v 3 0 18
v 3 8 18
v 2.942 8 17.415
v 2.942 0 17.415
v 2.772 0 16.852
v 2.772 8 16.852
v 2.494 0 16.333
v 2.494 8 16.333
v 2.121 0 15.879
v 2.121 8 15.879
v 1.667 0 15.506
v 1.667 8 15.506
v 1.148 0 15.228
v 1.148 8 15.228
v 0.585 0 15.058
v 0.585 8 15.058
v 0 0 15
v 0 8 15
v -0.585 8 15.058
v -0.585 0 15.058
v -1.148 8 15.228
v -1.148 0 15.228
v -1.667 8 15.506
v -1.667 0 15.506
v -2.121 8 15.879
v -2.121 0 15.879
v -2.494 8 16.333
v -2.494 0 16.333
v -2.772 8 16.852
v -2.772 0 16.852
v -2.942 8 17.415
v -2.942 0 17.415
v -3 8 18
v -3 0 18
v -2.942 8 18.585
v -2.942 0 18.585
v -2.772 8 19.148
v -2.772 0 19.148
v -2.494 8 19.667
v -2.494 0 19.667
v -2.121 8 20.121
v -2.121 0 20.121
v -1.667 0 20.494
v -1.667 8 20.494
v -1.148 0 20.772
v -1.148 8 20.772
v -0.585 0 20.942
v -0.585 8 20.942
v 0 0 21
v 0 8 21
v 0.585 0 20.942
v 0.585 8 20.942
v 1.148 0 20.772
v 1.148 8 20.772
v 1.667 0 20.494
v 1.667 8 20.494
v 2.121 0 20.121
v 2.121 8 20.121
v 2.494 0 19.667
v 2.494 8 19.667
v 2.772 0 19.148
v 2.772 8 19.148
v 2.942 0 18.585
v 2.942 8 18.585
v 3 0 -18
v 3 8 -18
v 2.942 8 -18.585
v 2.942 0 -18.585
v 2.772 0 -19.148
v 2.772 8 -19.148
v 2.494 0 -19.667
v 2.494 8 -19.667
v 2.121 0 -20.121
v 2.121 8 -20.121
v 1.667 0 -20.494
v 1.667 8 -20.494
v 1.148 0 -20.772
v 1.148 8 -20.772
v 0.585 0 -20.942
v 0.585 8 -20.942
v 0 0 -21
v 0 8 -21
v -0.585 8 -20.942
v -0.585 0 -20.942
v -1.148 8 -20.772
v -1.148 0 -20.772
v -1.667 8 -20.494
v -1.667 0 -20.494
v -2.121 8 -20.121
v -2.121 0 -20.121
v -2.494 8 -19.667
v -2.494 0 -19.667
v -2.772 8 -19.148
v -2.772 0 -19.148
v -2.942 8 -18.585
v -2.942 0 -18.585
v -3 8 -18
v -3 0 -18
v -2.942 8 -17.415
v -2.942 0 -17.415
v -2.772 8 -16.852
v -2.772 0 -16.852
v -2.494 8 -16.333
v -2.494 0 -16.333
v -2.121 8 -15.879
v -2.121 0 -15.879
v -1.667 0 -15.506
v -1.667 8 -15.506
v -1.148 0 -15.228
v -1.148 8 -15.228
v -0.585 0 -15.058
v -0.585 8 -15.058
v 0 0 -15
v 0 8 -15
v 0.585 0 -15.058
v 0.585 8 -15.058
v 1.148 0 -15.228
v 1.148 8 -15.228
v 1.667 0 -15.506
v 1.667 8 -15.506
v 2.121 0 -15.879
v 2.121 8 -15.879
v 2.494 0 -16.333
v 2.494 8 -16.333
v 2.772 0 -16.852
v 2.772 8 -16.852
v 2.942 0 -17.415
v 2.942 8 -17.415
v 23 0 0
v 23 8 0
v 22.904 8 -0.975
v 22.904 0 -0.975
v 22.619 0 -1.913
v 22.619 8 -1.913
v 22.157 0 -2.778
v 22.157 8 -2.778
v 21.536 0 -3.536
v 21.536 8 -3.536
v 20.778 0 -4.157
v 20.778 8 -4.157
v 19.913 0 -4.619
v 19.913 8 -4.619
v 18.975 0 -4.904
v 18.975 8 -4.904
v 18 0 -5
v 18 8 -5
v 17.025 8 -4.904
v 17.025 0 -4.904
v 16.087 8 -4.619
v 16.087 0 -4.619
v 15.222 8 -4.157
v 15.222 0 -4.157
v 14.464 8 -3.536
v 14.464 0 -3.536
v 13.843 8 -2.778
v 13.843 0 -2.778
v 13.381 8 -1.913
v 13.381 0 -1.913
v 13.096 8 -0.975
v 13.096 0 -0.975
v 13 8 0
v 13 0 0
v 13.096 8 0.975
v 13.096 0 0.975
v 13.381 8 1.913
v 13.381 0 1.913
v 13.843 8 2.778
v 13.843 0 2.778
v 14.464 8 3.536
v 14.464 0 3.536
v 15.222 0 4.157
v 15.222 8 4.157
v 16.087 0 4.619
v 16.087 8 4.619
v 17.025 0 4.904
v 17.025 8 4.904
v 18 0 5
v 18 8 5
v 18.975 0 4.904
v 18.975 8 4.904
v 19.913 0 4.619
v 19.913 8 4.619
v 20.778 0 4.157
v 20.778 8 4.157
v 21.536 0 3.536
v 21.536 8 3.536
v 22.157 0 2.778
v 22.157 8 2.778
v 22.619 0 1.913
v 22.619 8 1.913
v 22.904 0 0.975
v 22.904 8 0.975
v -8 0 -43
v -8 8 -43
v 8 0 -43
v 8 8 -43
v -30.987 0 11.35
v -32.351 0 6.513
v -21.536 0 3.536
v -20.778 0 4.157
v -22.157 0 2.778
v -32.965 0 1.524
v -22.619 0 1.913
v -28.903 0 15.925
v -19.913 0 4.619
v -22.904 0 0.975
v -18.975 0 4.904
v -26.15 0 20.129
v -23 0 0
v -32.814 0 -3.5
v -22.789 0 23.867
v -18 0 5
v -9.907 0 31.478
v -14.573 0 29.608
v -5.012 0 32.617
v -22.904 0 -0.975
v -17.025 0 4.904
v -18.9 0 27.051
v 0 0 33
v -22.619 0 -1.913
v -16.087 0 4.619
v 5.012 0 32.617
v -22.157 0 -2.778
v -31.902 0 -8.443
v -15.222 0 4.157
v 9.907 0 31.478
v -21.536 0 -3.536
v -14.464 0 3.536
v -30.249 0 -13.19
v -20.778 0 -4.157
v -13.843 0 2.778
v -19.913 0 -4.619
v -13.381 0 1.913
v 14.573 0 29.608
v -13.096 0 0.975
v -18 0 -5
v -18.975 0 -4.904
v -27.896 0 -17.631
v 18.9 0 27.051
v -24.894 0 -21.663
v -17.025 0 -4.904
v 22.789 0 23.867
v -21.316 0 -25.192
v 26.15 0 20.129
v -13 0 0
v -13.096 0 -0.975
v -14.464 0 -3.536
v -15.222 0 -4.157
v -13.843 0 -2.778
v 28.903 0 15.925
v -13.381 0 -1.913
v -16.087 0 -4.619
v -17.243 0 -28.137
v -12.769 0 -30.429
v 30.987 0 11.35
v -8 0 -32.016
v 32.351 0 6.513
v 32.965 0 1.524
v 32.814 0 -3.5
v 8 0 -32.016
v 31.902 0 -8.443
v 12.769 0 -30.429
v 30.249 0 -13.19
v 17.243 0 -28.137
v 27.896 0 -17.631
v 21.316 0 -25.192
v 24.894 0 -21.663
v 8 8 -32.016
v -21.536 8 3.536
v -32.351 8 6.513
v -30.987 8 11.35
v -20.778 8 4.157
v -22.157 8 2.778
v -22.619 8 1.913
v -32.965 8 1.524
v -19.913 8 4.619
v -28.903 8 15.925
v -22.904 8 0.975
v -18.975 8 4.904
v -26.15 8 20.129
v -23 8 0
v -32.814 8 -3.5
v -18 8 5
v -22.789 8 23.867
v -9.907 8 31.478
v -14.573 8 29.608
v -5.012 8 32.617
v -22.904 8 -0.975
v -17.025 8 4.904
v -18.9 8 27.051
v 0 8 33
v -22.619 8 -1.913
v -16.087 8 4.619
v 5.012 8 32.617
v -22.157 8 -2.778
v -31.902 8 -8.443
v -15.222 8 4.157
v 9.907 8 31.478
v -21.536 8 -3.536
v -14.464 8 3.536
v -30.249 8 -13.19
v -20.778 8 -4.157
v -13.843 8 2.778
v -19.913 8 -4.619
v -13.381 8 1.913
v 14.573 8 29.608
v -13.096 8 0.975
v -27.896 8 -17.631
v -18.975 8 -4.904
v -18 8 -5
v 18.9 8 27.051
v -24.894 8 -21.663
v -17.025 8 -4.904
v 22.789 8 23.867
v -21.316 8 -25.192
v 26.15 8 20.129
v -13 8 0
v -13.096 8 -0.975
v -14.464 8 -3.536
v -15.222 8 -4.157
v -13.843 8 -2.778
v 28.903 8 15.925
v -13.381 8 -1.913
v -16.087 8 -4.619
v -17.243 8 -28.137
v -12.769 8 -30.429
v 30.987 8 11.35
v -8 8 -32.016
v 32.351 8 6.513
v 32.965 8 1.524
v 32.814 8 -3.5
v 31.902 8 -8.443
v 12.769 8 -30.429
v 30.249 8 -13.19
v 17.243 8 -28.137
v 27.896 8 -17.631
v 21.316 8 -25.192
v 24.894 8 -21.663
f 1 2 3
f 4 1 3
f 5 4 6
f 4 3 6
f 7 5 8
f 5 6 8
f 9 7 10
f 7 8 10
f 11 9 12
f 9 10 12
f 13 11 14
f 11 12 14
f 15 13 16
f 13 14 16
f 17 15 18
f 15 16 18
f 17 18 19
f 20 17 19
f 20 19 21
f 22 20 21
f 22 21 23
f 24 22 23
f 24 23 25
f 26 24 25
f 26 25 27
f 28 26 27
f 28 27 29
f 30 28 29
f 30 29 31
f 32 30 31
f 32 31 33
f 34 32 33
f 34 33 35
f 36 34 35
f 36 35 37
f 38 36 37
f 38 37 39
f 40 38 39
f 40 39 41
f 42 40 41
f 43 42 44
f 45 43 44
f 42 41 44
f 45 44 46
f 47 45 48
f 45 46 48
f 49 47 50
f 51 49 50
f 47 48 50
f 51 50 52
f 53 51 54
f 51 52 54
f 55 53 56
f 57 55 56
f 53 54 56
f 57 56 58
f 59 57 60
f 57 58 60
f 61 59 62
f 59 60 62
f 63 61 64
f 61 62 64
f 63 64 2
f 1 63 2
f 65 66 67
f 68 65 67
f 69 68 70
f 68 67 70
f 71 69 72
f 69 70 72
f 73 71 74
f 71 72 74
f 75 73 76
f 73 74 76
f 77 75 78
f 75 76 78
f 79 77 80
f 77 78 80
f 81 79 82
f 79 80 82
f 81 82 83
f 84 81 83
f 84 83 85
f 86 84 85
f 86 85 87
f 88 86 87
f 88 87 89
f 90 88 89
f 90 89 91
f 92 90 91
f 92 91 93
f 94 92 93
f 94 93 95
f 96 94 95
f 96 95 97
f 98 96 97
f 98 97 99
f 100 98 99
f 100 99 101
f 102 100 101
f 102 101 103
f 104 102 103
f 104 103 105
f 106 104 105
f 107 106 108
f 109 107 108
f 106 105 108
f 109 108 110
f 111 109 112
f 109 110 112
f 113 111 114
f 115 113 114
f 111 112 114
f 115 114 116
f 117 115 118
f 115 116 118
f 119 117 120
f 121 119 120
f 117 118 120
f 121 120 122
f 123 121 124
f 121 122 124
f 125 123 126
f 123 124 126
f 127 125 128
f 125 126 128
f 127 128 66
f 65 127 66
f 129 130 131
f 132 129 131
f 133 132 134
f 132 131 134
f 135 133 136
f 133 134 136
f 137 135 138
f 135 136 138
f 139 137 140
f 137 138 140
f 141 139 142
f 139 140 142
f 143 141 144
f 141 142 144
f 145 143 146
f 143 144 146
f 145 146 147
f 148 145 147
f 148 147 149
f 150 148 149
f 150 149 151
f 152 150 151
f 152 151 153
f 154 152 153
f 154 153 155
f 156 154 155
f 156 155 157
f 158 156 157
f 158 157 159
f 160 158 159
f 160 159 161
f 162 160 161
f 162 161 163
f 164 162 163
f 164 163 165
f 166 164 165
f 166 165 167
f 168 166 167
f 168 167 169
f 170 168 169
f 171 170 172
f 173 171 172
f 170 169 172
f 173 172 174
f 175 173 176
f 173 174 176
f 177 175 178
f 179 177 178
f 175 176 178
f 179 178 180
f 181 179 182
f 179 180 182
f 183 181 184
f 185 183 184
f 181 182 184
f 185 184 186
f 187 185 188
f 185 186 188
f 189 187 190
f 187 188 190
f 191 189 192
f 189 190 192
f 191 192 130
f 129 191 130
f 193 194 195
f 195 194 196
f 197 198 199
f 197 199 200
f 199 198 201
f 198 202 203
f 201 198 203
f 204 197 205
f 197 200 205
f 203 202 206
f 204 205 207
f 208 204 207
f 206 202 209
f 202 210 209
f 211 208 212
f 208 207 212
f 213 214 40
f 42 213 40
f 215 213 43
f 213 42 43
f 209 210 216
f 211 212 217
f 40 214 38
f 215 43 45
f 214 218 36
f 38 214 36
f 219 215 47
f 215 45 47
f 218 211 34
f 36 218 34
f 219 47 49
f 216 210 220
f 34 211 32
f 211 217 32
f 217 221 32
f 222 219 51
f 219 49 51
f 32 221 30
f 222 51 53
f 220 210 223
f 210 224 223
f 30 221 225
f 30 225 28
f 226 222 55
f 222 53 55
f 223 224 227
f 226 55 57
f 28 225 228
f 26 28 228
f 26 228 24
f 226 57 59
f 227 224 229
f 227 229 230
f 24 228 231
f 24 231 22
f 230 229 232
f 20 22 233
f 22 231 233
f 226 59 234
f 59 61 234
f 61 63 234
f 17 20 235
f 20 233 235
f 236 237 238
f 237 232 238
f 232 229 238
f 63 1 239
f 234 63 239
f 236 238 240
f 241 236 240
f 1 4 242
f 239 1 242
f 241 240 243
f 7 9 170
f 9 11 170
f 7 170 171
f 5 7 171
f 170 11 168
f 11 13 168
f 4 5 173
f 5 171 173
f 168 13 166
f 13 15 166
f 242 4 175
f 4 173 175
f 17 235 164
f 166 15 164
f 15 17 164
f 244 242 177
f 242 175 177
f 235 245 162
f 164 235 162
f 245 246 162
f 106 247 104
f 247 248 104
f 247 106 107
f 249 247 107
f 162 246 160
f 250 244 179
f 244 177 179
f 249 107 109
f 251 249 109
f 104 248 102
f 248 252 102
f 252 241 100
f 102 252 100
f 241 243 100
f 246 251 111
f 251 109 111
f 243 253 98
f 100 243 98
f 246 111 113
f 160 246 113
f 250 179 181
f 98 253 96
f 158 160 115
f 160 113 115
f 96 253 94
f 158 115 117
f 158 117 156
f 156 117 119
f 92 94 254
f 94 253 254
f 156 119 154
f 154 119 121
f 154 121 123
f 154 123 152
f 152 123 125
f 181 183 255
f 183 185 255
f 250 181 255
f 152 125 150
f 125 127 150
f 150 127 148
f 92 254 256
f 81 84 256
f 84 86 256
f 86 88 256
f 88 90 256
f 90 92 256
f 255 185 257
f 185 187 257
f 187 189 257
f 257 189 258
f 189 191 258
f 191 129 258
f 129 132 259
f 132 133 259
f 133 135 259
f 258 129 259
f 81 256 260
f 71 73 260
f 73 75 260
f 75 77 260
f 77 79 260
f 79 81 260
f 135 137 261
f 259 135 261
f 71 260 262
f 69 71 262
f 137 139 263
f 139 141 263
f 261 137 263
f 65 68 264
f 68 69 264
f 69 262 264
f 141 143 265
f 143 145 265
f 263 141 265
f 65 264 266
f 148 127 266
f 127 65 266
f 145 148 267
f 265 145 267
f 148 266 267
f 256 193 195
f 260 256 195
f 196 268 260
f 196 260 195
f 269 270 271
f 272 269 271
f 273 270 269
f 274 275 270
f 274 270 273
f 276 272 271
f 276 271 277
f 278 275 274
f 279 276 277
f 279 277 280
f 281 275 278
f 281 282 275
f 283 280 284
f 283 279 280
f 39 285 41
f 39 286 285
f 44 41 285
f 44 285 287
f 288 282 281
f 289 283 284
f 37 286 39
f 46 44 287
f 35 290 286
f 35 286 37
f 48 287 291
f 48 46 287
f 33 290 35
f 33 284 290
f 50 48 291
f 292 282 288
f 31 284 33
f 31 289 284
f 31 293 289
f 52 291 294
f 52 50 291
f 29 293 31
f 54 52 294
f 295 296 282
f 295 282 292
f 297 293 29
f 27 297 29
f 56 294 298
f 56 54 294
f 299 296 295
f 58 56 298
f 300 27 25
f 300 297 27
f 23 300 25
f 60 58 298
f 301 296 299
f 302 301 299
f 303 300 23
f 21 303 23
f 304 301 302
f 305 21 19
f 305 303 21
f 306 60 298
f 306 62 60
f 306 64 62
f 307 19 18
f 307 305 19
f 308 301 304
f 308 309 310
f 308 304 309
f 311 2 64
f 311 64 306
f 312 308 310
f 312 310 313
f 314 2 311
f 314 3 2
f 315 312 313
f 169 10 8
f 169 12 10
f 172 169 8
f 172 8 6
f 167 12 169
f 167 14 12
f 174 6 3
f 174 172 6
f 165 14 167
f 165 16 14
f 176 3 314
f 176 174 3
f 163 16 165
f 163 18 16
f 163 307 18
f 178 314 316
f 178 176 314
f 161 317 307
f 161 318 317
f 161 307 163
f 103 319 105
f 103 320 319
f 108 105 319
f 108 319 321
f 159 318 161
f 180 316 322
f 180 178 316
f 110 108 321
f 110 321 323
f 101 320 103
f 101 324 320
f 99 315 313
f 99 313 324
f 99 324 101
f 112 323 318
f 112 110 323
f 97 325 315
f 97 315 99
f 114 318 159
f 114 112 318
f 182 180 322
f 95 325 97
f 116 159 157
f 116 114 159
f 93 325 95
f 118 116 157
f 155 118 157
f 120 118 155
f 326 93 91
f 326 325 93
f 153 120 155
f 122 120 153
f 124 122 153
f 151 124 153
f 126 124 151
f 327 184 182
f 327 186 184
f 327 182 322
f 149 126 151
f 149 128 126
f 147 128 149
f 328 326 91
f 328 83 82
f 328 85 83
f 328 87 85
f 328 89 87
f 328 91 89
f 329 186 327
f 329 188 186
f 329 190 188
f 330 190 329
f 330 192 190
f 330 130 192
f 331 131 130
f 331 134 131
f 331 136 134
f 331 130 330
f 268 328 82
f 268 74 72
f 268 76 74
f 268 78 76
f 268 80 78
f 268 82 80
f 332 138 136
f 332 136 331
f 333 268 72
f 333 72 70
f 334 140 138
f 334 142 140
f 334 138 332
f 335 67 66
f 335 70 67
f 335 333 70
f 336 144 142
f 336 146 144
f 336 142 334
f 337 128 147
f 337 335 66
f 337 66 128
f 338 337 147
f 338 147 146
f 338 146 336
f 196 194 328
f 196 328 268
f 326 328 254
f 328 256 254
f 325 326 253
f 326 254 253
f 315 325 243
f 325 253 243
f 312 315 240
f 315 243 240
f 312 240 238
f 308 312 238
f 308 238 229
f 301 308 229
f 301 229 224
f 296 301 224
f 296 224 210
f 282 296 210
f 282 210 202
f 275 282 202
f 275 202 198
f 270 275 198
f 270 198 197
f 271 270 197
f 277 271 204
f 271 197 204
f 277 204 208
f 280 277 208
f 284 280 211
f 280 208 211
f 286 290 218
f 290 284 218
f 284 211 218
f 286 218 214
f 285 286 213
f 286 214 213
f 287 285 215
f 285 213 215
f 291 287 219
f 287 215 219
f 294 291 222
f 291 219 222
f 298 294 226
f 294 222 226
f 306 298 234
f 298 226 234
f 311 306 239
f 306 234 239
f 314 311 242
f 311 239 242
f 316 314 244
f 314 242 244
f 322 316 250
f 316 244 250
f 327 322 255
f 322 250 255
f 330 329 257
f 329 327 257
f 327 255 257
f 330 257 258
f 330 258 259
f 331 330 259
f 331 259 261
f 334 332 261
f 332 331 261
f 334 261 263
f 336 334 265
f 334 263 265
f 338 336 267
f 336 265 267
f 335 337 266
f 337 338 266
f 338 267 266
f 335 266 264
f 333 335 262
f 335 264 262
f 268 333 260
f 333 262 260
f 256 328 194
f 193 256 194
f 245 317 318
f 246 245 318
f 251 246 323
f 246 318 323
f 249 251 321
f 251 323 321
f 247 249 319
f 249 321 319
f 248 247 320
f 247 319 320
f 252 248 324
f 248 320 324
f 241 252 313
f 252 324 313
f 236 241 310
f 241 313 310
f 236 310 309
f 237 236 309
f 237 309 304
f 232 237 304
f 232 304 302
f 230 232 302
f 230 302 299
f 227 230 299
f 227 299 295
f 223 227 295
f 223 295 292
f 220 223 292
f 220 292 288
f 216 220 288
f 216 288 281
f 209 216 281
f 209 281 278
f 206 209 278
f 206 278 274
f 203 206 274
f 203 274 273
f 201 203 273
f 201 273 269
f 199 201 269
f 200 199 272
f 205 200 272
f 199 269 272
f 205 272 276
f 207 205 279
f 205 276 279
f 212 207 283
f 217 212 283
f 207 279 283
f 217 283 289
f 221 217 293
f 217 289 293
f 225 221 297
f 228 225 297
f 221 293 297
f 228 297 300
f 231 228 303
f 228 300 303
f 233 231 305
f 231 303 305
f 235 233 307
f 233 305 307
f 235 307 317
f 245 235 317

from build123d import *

# Parameters (mm, degrees)
SKETCH1_R           = 33
BOSS_EXTRUDE1_DEPTH = 8
SKETCH2_W           = 16
SKETCH2_H           = 10.984378813
BOSS_EXTRUDE2_DEPTH = 8
SKETCH3_R           = 3
SKETCH3_R_2         = 5
CUT_EXTRUDE1_DEPTH  = 9


with BuildPart() as part:
    # Sketch1 → Boss-Extrude1 (new body)
    with BuildSketch(Plane(origin=(0, 0, 0), x_dir=(1, 0, 0), z_dir=(0, 1, 0))):
        Circle(SKETCH1_R)
    extrude(amount=BOSS_EXTRUDE1_DEPTH)

    # Sketch2 → Boss-Extrude2 (add)
    with BuildSketch(Plane(origin=(0, 8, 0), x_dir=(1, 0, 0), z_dir=(0, 1, 0))):
        with Locations((0, 37.507810593)):
            Rectangle(SKETCH2_W, SKETCH2_H)
    extrude(amount=-BOSS_EXTRUDE2_DEPTH)

    # Sketch3 → Cut-Extrude1 (cut, through all)
    with BuildSketch(Plane(origin=(0, 8, 0), x_dir=(1, 0, 0), z_dir=(0, 1, 0))):
        with Locations((0, 18)):
            Circle(SKETCH3_R)
        with Locations((-18, 0)):
            Circle(SKETCH3_R_2)
        with Locations((0, -18)):
            Circle(SKETCH3_R)
        with Locations((18, 0)):
            Circle(SKETCH3_R_2)
    extrude(amount=-CUT_EXTRUDE1_DEPTH, mode=Mode.SUBTRACT)


solid = part.part
